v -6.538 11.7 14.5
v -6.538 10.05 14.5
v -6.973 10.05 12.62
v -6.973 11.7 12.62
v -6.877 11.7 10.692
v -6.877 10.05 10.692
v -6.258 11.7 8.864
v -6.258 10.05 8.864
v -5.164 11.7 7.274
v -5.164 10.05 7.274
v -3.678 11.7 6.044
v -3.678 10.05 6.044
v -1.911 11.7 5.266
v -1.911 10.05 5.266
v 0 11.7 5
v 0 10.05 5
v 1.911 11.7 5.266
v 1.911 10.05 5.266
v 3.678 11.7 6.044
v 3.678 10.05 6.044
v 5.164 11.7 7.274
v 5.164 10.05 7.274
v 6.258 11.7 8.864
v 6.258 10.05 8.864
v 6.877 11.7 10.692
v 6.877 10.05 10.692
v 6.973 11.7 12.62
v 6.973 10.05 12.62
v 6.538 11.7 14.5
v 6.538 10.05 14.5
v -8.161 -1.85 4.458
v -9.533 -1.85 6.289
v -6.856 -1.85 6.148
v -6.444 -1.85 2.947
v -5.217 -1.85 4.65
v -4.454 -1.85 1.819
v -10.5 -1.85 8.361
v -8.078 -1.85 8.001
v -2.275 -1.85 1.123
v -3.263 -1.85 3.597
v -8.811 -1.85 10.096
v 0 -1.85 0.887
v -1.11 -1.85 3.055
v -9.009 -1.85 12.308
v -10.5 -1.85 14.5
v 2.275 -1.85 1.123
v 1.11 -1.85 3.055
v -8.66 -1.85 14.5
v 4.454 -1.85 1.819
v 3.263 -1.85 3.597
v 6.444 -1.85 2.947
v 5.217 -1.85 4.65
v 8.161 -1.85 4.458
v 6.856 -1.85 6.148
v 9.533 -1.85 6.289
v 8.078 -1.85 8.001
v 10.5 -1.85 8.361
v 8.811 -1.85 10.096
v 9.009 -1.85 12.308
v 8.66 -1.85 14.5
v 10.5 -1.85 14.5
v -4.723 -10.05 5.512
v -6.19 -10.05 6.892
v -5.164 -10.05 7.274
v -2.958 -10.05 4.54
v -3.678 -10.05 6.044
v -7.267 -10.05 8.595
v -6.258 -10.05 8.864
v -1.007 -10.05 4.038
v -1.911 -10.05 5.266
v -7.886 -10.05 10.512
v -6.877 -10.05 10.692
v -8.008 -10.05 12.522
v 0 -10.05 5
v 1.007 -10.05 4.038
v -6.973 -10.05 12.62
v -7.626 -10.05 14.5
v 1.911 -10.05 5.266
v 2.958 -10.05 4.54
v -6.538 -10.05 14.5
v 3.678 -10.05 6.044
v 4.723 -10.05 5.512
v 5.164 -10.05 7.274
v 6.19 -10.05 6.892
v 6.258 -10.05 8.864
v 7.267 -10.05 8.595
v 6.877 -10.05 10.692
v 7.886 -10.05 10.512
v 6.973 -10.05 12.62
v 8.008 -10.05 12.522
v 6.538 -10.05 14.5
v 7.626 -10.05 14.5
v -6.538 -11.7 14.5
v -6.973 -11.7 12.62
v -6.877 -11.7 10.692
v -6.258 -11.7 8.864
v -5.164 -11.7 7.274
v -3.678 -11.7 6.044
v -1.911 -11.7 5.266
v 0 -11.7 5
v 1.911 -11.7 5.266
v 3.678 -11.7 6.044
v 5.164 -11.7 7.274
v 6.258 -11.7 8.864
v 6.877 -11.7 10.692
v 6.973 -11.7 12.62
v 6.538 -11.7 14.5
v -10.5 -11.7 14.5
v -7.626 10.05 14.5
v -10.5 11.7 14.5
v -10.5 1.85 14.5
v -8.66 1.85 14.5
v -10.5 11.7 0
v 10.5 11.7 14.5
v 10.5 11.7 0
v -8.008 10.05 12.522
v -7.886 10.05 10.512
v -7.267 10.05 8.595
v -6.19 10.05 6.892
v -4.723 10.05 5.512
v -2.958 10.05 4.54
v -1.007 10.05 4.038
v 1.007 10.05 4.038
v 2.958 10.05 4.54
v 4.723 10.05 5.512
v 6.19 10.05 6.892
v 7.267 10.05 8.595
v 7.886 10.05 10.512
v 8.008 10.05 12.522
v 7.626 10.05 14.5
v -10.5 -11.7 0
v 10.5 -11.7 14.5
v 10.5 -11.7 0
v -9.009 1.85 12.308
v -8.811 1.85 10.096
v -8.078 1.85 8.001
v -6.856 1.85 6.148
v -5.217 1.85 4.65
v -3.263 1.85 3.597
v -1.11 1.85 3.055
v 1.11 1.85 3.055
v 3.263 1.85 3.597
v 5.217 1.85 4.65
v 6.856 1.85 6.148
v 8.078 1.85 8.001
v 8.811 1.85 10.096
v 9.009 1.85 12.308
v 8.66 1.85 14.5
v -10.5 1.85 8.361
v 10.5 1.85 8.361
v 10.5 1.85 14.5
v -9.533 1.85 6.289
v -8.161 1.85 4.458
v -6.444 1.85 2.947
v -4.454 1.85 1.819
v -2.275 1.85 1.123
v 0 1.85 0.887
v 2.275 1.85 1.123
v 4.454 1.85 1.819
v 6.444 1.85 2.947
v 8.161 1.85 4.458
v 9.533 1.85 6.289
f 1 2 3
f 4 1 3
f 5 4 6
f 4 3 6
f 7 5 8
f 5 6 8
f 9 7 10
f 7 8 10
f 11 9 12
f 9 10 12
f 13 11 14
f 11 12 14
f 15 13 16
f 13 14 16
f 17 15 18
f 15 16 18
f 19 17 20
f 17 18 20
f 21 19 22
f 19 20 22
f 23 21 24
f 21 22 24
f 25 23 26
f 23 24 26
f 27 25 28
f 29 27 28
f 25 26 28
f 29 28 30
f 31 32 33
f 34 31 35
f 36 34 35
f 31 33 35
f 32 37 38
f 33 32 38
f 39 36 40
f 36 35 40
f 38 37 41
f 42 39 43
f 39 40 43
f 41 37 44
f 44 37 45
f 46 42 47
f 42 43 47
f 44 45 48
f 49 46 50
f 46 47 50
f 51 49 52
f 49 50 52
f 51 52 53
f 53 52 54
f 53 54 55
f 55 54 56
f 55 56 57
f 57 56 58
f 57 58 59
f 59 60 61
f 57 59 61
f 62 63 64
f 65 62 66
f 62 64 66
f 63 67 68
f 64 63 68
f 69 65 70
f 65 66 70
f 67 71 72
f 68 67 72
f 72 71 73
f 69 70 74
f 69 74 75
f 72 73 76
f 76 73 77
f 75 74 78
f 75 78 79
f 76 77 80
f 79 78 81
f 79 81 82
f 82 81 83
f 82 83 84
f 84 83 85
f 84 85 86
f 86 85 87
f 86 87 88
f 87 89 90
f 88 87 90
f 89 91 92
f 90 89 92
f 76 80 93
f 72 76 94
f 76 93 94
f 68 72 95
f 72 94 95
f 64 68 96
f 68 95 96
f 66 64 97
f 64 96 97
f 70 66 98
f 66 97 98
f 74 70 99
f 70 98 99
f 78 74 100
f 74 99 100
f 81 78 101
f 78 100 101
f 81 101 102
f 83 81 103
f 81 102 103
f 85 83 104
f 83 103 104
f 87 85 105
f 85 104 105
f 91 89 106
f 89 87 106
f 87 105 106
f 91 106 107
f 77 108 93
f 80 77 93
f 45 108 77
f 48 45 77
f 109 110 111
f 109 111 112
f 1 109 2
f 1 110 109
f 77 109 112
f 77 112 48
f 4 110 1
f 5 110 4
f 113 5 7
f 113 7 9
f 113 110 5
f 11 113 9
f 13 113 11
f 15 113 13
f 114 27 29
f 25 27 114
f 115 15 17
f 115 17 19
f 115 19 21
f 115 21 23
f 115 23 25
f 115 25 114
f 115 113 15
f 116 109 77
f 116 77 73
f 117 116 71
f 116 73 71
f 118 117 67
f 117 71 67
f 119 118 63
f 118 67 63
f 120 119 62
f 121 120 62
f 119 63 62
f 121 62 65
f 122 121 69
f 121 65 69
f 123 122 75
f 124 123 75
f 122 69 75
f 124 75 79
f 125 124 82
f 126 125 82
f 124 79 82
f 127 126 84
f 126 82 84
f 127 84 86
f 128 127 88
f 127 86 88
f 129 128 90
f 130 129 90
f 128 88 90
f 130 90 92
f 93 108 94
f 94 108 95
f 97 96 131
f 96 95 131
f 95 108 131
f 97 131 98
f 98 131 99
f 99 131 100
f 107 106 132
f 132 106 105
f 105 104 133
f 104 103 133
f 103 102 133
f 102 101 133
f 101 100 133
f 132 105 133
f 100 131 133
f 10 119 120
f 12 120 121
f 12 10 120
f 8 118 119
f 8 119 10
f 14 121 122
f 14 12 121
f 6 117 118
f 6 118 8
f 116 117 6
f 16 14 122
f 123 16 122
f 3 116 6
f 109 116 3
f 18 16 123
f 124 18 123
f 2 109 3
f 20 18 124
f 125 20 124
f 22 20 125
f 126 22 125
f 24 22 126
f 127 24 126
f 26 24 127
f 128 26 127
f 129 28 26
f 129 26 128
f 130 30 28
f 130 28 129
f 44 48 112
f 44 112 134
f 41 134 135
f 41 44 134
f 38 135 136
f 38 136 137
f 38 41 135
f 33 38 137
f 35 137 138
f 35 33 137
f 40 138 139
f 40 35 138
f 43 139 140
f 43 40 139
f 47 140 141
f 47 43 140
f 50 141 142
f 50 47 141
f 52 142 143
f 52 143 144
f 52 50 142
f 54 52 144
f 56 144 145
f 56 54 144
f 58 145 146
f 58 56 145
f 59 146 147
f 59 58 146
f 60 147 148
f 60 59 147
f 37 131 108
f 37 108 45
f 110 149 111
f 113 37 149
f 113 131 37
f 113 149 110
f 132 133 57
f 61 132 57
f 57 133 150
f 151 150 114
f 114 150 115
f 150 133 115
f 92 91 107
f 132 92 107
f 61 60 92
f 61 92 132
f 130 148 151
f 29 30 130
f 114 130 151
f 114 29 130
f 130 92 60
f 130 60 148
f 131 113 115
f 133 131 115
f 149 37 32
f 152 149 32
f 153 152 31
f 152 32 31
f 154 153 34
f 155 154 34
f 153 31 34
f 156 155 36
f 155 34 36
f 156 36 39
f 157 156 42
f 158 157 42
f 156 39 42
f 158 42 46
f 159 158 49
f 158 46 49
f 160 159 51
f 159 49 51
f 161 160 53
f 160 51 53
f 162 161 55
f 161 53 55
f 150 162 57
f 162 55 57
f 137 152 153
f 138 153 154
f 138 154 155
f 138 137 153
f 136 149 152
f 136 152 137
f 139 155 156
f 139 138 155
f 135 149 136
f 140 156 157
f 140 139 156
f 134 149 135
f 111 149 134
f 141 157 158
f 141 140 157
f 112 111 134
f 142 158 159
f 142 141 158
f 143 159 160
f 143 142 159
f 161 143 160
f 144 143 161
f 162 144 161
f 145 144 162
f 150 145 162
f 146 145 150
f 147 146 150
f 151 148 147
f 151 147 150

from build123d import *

# Parameters (mm, degrees)
PAD002_DEPTH = 1.85
SKETCH001_R  = 8.025
PAD001_DEPTH = 10.05
SKETCH_W     = 21
SKETCH_H     = 23.4
PAD_DEPTH    = 14.5
SKETCH002_R  = 7
POCKET_DEPTH = 23.401


with BuildPart() as pad002:
    # Sketch003 → Pad002 (new body, symmetric)
    with BuildSketch(Plane.XZ):
        with BuildLine():
            Line((-8.5, 15), (-10.7, 15))
            ThreePointArc((-10.7, 15), (0, 0.887395), (10.7, 15))
            Line((8.5, 15), (10.7, 15))
            ThreePointArc((-8.5, 15), (0, 2.986122), (8.5, 15))
        make_face()
    extrude(amount=PAD002_DEPTH, both=True)


with BuildPart() as pad001:
    # Sketch001 → Pad001 (new body, symmetric)
    with BuildSketch(Plane.XZ):
        with Locations((0, 12)):
            Circle(SKETCH001_R)
    extrude(amount=PAD001_DEPTH, both=True)


with BuildPart() as cut001:
    # Sketch → Pad (new body)
    with BuildSketch(Plane.XY):
        Rectangle(SKETCH_W, SKETCH_H)
    extrude(amount=PAD_DEPTH)

    # Cut: cut Pad001
    add(pad001.part, mode=Mode.SUBTRACT)

    # Sketch002 → Pocket (cut, through all)
    with BuildSketch(Plane.XZ.offset(11.7)):
        with Locations((0, 12)):
            Circle(SKETCH002_R)
    extrude(amount=-POCKET_DEPTH, mode=Mode.SUBTRACT)

    # Cut001: cut Pad002
    add(pad002.part, mode=Mode.SUBTRACT)


solid = cut001.part
